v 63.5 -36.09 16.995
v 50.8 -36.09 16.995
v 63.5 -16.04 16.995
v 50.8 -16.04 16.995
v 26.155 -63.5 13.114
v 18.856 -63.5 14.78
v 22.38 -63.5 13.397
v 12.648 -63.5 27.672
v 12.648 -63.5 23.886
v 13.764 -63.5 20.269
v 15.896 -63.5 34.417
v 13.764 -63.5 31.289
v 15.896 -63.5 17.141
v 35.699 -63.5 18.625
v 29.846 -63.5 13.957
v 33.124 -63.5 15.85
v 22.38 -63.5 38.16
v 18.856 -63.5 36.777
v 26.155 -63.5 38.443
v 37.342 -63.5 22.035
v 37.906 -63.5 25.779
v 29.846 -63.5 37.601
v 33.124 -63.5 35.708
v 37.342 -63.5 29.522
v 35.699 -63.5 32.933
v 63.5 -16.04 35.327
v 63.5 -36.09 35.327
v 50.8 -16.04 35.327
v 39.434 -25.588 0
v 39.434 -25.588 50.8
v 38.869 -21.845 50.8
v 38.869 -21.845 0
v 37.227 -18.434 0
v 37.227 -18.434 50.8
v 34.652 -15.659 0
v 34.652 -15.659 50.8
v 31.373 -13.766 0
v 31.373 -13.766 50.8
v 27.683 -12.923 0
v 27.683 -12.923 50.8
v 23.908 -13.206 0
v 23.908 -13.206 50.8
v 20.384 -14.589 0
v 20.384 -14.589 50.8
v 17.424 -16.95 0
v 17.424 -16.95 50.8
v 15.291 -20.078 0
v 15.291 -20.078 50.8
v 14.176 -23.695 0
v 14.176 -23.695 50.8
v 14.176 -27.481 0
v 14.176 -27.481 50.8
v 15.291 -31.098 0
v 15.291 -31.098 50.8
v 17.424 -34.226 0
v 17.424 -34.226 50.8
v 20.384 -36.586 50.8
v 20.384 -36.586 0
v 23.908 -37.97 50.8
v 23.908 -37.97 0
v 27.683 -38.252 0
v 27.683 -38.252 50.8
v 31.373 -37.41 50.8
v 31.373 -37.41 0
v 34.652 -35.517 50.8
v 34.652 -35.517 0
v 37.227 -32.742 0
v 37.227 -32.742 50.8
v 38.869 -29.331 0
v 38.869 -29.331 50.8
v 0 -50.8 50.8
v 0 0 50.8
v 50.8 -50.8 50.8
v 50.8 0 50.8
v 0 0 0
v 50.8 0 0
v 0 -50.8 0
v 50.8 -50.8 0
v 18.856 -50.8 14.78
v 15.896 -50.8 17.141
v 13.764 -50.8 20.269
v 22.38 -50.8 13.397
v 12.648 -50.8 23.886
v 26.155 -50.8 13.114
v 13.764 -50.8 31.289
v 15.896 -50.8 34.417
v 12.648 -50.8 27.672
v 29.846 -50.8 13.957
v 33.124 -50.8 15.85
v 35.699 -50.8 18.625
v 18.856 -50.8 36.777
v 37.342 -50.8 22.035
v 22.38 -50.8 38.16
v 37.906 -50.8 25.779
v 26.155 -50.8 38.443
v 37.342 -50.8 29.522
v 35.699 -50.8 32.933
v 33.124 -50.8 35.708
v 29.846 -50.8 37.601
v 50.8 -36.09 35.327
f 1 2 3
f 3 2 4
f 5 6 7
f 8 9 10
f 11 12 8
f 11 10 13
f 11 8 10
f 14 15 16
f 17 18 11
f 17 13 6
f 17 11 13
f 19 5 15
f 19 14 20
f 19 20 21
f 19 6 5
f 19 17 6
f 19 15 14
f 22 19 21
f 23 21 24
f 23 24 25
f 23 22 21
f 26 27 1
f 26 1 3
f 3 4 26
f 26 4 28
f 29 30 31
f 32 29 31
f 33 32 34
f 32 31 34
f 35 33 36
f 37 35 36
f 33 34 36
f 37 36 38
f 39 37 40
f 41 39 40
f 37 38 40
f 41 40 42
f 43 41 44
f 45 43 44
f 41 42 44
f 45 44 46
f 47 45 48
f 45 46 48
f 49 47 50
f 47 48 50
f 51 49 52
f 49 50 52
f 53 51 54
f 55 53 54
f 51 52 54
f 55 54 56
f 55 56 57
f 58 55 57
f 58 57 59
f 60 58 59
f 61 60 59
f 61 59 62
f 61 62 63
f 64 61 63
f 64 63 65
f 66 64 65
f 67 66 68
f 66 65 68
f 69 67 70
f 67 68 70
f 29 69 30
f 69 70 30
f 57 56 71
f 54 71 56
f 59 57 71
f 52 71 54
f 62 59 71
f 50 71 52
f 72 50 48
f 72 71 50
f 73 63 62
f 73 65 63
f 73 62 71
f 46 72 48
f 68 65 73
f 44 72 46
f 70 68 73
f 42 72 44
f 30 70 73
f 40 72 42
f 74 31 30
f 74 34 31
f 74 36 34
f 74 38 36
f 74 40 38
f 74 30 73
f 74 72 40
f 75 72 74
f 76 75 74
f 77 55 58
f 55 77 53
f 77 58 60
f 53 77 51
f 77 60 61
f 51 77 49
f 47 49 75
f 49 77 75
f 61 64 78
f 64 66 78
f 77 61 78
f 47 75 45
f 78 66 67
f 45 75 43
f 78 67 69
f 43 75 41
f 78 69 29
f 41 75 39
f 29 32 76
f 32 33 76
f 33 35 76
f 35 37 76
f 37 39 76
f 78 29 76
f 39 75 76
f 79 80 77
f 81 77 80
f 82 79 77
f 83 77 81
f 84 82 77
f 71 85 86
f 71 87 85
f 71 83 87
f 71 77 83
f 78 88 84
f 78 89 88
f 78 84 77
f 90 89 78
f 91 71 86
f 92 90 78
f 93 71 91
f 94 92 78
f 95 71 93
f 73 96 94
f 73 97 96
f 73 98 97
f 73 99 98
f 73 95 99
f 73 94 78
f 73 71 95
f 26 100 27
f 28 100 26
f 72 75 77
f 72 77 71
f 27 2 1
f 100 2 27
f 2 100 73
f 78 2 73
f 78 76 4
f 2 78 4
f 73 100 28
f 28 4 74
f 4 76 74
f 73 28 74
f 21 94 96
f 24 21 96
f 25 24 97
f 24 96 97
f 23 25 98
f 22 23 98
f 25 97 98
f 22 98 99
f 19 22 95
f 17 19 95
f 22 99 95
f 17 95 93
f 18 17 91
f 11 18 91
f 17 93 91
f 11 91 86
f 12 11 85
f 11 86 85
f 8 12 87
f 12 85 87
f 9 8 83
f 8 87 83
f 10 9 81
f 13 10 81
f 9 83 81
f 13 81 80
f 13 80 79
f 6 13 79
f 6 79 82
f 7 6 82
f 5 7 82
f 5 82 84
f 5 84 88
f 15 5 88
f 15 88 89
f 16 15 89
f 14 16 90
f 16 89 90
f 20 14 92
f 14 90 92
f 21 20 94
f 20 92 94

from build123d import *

# Parameters (mm, degrees)
F0_W     = 50.8
F0_H     = 50.8
F1_DEPTH = 50.8
F2_R     = 12.7
F3_DEPTH = 12.7
F4_W     = 20.050239
F4_H     = 18.331647
F5_DEPTH = 12.7
F6_R     = 12.7
F7_DEPTH = 50.8


with BuildPart() as f1:
    # F0 (on Front) → F1 (new body)
    with BuildSketch(Plane.XZ):
        with Locations((25.4, 25.4)):
            Rectangle(F0_W, F0_H)
    extrude(amount=F1_DEPTH)

    # F2 (on face) → F3 (join)
    with BuildSketch(Plane.XZ.offset(50.8)):
        with Locations((25.206016, 25.778878)):
            Circle(F2_R)
    extrude(amount=F3_DEPTH)

    # F4 (on face) → F5 (join)
    with BuildSketch(Plane.YZ.offset(50.8)):
        with Locations((-26.06531, 26.160787)):
            Rectangle(F4_W, F4_H)
    extrude(amount=F5_DEPTH)

    # F6 (on face) → F7 (cut)
    with BuildSketch(Plane.XY.offset(50.8)):
        with Locations((26.733654, -25.587924)):
            Circle(F6_R)
    extrude(amount=-F7_DEPTH, mode=Mode.SUBTRACT)


solid = f1.part
